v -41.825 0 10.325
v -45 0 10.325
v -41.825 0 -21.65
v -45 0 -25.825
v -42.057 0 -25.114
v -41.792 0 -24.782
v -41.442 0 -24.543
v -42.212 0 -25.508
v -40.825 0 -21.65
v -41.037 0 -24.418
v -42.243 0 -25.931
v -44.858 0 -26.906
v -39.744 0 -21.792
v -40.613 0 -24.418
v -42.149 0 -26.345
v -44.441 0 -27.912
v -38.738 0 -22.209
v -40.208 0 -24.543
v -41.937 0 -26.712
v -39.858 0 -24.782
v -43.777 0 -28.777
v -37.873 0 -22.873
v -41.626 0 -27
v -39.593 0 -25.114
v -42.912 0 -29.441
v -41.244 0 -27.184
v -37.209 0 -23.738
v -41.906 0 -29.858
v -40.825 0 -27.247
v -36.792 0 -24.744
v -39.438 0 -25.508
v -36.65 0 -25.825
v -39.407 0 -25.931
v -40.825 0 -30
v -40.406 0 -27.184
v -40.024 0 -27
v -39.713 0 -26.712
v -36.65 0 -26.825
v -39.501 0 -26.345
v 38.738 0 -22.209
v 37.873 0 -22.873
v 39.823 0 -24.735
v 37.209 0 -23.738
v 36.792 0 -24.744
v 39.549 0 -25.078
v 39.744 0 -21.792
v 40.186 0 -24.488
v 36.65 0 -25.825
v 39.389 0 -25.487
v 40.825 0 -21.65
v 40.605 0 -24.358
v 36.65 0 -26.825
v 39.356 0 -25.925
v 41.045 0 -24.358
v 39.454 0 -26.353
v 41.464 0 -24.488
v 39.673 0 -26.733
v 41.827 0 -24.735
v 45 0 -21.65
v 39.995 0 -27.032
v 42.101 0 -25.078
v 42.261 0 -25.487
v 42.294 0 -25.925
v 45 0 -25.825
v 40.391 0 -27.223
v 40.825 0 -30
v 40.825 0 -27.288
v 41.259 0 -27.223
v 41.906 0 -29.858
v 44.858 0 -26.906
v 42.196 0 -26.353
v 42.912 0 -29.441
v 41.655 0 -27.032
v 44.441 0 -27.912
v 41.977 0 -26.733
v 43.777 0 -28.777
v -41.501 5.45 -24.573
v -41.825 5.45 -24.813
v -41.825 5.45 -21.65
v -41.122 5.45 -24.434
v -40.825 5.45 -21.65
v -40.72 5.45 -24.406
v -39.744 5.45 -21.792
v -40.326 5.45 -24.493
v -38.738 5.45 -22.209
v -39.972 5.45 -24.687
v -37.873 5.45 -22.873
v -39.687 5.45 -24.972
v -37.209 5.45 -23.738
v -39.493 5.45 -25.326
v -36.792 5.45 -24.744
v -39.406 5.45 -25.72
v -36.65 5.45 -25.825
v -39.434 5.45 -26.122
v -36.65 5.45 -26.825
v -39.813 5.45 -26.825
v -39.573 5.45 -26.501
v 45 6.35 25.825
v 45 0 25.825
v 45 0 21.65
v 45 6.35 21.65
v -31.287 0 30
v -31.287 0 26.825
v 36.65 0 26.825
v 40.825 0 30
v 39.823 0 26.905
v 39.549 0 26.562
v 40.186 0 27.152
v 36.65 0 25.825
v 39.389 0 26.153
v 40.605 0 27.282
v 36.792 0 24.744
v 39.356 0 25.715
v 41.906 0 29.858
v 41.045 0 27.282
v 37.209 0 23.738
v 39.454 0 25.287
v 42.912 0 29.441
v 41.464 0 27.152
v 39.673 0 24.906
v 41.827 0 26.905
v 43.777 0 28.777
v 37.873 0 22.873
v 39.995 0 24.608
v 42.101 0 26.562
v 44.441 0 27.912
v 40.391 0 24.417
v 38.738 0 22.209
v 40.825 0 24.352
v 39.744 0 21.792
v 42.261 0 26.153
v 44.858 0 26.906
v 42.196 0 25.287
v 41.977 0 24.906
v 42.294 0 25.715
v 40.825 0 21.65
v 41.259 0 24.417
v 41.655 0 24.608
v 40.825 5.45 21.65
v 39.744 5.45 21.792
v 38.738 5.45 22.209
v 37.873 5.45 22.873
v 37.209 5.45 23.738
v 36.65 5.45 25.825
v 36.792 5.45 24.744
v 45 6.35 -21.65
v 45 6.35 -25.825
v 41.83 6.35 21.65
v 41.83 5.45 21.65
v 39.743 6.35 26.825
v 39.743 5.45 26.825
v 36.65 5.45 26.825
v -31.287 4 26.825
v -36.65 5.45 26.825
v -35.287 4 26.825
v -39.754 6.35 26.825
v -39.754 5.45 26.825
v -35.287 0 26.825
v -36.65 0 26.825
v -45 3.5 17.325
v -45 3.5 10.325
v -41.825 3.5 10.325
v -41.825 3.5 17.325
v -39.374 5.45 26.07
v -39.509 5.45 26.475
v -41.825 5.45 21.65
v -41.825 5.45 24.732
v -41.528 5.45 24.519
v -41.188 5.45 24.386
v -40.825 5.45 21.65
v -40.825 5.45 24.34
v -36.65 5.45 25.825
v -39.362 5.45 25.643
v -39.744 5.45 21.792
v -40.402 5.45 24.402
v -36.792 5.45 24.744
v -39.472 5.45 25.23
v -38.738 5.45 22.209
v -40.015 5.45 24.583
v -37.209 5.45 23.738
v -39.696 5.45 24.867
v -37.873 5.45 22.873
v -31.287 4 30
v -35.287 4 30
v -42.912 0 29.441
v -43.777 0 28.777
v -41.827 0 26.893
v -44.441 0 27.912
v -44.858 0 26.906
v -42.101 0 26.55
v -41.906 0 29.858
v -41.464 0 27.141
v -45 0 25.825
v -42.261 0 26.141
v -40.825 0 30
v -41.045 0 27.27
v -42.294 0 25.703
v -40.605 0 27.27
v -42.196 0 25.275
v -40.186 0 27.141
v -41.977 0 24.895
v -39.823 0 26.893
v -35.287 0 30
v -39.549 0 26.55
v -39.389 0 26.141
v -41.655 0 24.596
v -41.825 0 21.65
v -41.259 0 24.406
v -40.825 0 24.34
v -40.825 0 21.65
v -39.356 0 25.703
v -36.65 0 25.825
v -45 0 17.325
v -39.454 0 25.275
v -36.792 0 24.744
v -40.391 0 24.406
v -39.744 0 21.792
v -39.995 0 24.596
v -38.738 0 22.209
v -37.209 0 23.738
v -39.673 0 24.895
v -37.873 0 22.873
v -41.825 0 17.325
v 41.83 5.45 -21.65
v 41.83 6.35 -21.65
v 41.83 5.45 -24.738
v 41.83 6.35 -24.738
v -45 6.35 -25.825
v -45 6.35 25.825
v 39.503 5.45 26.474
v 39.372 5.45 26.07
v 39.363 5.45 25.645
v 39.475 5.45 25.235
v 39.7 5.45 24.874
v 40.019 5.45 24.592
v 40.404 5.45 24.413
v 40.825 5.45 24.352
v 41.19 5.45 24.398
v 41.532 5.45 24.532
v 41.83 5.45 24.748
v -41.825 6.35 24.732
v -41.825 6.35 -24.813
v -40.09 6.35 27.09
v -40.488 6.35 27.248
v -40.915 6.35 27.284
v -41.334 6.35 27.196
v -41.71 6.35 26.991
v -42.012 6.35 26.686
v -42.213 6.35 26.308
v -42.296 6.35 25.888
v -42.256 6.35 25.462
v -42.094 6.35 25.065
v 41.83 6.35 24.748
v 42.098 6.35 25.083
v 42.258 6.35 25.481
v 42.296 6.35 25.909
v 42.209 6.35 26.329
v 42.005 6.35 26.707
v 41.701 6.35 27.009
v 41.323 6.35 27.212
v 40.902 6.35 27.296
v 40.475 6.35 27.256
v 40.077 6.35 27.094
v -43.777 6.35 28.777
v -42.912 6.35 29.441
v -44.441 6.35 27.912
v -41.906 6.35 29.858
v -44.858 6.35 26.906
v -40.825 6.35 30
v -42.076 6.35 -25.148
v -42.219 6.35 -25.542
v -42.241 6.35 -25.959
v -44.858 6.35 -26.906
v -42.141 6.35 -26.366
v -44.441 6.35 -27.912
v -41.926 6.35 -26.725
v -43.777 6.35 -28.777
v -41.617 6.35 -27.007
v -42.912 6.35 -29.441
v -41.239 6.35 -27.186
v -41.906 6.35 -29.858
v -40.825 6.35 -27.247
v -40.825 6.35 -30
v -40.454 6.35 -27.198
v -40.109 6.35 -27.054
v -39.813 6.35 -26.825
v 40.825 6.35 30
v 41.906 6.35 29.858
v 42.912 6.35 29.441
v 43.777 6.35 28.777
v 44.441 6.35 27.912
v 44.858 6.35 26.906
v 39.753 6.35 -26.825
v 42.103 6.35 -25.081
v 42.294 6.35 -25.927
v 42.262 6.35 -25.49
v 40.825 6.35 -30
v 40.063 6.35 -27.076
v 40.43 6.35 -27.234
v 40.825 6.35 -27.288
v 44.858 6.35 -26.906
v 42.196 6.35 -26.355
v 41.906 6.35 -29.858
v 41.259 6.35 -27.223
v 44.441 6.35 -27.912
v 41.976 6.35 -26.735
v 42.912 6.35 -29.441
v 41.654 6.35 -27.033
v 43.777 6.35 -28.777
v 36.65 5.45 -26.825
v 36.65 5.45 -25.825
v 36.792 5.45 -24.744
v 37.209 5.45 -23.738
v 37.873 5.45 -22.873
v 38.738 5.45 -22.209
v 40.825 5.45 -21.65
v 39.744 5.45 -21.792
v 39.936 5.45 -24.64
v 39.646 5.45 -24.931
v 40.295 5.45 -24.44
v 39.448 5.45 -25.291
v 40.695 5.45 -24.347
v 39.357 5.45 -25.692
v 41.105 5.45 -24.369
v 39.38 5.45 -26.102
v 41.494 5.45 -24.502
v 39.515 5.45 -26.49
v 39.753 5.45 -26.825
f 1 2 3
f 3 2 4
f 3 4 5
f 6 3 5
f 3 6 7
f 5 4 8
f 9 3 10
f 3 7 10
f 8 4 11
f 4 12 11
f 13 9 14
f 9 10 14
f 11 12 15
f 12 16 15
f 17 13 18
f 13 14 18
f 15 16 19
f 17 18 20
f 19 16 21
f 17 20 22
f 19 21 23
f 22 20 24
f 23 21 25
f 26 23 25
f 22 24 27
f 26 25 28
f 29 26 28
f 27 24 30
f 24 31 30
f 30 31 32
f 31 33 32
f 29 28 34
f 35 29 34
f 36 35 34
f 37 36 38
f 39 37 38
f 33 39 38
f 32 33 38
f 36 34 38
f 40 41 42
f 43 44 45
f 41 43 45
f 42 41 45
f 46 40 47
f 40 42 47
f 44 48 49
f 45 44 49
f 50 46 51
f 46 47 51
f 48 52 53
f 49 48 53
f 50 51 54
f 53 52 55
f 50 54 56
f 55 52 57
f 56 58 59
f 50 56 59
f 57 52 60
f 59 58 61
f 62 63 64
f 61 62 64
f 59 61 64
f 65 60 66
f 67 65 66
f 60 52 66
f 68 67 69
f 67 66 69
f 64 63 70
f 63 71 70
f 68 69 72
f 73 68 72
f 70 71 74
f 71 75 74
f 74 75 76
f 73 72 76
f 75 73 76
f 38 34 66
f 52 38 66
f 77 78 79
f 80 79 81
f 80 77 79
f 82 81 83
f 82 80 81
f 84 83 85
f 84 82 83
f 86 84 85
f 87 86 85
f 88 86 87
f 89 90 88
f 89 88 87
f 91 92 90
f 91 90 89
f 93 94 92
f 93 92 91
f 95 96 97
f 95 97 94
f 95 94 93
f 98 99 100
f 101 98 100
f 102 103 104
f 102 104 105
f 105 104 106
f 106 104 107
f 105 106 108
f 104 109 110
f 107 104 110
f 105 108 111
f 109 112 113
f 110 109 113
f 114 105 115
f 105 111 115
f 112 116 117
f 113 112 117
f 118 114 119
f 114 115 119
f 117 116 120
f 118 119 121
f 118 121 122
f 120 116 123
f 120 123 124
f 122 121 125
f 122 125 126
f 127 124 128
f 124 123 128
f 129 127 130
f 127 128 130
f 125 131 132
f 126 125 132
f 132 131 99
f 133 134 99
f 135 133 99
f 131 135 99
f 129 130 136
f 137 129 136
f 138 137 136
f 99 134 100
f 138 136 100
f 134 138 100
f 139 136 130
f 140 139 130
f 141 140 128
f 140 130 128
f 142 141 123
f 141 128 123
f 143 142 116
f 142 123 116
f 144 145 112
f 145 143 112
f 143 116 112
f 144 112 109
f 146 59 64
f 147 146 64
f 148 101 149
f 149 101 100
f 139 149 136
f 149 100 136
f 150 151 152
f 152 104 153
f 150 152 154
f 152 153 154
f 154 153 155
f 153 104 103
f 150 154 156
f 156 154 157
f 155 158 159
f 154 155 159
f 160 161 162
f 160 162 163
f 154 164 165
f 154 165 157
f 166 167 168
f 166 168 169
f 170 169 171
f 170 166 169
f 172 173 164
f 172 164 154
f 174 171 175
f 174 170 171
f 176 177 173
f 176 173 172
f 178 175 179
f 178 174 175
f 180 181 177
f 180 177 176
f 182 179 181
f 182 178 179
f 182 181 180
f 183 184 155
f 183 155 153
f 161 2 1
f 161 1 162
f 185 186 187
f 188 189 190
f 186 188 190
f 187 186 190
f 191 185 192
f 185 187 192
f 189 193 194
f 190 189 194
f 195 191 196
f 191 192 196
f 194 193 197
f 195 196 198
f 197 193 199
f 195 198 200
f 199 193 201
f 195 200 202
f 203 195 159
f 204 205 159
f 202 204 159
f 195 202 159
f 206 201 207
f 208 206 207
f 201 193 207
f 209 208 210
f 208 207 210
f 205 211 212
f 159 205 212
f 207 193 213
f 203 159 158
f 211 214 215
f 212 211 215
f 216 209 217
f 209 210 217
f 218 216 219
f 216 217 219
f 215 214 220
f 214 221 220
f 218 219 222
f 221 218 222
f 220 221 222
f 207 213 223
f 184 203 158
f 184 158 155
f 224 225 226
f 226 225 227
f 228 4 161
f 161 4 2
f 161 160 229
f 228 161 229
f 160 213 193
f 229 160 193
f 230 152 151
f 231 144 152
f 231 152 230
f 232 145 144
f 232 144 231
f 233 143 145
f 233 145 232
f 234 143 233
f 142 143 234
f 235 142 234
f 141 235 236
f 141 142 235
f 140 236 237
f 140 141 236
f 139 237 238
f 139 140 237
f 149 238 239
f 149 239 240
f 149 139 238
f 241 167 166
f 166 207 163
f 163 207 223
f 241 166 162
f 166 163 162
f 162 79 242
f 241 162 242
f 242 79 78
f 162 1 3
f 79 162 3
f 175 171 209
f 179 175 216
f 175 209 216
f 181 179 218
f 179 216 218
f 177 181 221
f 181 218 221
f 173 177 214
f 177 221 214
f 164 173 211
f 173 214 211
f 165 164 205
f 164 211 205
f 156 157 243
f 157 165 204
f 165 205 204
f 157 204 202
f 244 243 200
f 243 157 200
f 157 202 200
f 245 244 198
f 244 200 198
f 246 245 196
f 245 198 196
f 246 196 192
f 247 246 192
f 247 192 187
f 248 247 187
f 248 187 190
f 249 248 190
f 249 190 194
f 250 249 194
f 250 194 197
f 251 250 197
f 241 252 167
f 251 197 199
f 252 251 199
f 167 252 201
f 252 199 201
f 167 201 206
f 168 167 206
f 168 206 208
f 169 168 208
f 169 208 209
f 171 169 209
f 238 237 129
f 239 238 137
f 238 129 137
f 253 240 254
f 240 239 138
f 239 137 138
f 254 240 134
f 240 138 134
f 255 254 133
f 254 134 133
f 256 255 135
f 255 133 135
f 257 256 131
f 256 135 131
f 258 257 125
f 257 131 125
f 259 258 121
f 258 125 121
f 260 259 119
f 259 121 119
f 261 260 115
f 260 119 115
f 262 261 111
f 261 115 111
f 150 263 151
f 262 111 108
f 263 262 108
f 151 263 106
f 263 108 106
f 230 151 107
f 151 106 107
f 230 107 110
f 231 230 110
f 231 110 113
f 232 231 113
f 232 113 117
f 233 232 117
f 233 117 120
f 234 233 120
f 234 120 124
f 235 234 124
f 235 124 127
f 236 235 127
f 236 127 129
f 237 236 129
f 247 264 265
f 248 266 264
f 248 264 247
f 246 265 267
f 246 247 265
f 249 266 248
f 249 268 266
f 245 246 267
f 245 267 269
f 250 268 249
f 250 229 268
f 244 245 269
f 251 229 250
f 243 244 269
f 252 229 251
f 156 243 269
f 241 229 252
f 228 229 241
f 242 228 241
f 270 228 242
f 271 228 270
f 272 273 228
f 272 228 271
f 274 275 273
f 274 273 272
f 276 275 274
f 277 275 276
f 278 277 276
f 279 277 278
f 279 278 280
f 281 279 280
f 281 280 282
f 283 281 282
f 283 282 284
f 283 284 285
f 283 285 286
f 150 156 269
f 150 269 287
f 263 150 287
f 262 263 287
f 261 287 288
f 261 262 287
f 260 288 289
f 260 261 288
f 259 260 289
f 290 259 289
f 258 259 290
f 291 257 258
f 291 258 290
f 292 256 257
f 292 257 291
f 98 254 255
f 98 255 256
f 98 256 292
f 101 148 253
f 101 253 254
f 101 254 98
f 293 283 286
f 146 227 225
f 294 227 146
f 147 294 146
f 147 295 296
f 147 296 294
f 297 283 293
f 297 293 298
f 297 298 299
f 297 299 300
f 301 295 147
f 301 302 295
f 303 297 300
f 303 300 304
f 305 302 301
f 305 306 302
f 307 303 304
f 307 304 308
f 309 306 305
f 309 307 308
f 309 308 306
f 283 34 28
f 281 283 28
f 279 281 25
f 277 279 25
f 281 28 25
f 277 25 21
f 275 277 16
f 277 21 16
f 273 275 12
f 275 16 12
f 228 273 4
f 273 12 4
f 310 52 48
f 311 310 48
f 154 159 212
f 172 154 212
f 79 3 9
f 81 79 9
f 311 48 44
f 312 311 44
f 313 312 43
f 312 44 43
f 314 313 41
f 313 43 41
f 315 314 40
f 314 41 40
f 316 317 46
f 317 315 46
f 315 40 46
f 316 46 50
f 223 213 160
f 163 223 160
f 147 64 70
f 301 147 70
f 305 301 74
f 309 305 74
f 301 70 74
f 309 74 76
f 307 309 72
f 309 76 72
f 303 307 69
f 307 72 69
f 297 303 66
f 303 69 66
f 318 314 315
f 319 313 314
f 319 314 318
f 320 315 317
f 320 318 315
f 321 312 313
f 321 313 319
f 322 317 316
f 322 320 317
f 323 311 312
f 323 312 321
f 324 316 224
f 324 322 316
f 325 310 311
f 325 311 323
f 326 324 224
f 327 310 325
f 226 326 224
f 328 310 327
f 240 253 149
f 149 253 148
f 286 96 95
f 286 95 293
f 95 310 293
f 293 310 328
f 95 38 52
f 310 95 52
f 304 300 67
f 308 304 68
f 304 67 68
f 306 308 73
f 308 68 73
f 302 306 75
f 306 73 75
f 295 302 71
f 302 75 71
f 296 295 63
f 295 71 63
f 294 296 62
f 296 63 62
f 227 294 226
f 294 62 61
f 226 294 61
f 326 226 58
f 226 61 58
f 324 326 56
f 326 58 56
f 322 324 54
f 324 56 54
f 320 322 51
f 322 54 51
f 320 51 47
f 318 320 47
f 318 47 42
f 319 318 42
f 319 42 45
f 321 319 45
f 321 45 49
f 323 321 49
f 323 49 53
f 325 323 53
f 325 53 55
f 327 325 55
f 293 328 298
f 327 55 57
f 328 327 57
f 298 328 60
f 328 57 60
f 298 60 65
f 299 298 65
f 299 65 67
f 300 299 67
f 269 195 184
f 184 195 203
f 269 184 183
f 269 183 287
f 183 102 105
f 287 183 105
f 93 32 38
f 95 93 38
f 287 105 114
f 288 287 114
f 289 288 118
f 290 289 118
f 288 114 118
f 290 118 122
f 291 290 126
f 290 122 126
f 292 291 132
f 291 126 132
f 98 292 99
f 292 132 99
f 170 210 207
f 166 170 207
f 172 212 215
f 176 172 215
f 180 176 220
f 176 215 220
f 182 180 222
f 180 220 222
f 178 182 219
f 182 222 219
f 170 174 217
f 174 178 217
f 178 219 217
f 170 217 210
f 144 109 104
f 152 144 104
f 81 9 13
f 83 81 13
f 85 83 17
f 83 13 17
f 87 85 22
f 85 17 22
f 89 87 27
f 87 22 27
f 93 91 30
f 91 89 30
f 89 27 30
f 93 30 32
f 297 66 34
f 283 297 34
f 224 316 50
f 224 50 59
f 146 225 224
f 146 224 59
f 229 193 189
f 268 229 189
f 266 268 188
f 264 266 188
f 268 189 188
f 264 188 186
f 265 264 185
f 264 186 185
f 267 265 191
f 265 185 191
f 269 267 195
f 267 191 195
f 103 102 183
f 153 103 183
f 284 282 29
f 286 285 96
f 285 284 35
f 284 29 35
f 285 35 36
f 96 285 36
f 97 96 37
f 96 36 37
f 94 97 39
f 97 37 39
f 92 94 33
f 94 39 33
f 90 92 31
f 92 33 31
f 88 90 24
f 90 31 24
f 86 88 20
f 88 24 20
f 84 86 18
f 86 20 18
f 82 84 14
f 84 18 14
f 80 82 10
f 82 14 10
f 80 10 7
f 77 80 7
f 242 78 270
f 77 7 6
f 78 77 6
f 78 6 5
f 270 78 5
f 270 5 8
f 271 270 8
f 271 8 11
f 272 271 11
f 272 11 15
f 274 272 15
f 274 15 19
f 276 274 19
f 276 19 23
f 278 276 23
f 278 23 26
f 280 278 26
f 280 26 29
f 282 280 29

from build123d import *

# Parameters (mm, degrees)
BOSS_EXTRUDE3_DEPTH = 6.35
SKETCH5_W           = 7
SKETCH5_H           = 7
CUT_EXTRUDE3_DEPTH  = 3.175
SKETCH7_R           = 1.4224
SKETCH7_R_2         = 1.4732
CUT_EXTRUDE5_DEPTH  = 6.35
SKETCH8_W           = 3.175
SKETCH8_H           = 43.3
CUT_EXTRUDE6_DEPTH  = 10
SKETCH9_W           = 4
SKETCH9_H           = 4
CUT_EXTRUDE8_DEPTH  = 4
SKETCH10_W          = 5.175
SKETCH10_H          = 5.175
SKETCH10_W_2        = 5.18
CUT_EXTRUDE9_DEPTH  = 0.9


with BuildPart() as part:
    # Sketch2 → Boss-Extrude3 (new body)
    with BuildSketch(Plane(origin=(0, 0, 0), x_dir=(1, 0, 0), z_dir=(0, 1, 0))):
        with BuildLine():
            Line((-45, 25.825), (-45, -25.825))
            ThreePointArc((-45, -25.825), (-43.777170811, -28.777170811), (-40.825, -30))
            Line((-40.825, -30), (40.825, -30))
            ThreePointArc((40.825, -30), (43.777170811, -28.777170811), (45, -25.825))
            Line((45, -25.825), (45, 25.825))
            ThreePointArc((45, 25.825), (43.777170811, 28.777170811), (40.825, 30))
            Line((40.825, 30), (-40.825, 30))
            ThreePointArc((-40.825, 30), (-43.777170811, 28.777170811), (-45, 25.825))
        make_face()
        with BuildLine():
            Line((40.825, 21.65), (41.825, 21.65))
            Line((41.825, 21.65), (41.825, -21.65))
            Line((41.825, -21.65), (40.825, -21.65))
            ThreePointArc((40.825, -21.65), (37.872829189, -22.872829189), (36.65, -25.825))
            Line((36.65, -25.825), (36.65, -26.825))
            Line((36.65, -26.825), (-36.65, -26.825))
            Line((-36.65, -26.825), (-36.65, -25.825))
            ThreePointArc((-36.65, -25.825), (-37.872829189, -22.872829189), (-40.825, -21.65))
            Line((-40.825, -21.65), (-41.825, -21.65))
            Line((-41.825, -21.65), (-41.825, 21.65))
            Line((-41.825, 21.65), (-40.825, 21.65))
            ThreePointArc((-40.825, 21.65), (-37.872829189, 22.872829189), (-36.65, 25.825))
            Line((-36.65, 25.825), (-36.65, 26.825))
            Line((-36.65, 26.825), (36.65, 26.825))
            Line((36.65, 26.825), (36.65, 25.825))
            ThreePointArc((36.65, 25.825), (37.872829189, 22.872829189), (40.825, 21.65))
        make_face(mode=Mode.SUBTRACT)
    extrude(amount=BOSS_EXTRUDE3_DEPTH)

    # Sketch5 → Cut-Extrude3 (cut)
    with BuildSketch(Plane.ZY.offset(45)):
        with Locations((13.825, 0)):
            Rectangle(SKETCH5_W, SKETCH5_H)
    extrude(amount=-CUT_EXTRUDE3_DEPTH, mode=Mode.SUBTRACT)

    # Sketch7 → Cut-Extrude5 (cut)
    with BuildSketch(Plane.XZ):
        with Locations(Location((-40.825, -25.825, 0), (0, 0, 270))):
            Circle(SKETCH7_R)
        with Locations(Location((-40.825, 25.81356336, 0), (0, 0, 270))):
            Circle(SKETCH7_R_2)
        with Locations(Location((40.825, 25.825, 0), (0, 0, 270))):
            Circle(SKETCH7_R_2)
        with Locations(Location((40.825, -25.81487963, 0), (0, 0, 270))):
            Circle(SKETCH7_R_2)
    extrude(amount=-CUT_EXTRUDE5_DEPTH, mode=Mode.SUBTRACT)

    # Sketch8 → Cut-Extrude6 (cut)
    with BuildSketch(Plane(origin=(0, 6.35, 0), x_dir=(1, 0, 0), z_dir=(0, 1, 0))):
        with Locations((43.4125, 0)):
            Rectangle(SKETCH8_W, SKETCH8_H)
    extrude(amount=-CUT_EXTRUDE6_DEPTH, mode=Mode.SUBTRACT)

    # Sketch9 → Cut-Extrude8 (cut)
    with BuildSketch(Plane.XY.offset(30)):
        with Locations((-33.2866, 2)):
            Rectangle(SKETCH9_W, SKETCH9_H)
    extrude(amount=-CUT_EXTRUDE8_DEPTH, mode=Mode.SUBTRACT)

    # Sketch10 → Cut-Extrude9 (cut)
    with BuildSketch(Plane(origin=(0, 6.35, 0), x_dir=(1, 0, 0), z_dir=(0, 1, 0))):
        with Locations((-39.2375, 24.2375)):
            Rectangle(SKETCH10_W, SKETCH10_H)
        with Locations((-39.2375, -24.2375)):
            Rectangle(SKETCH10_W, SKETCH10_H)
        with Locations((39.24, -24.2375)):
            Rectangle(SKETCH10_W_2, SKETCH10_H)
        with Locations((39.24, 24.2375)):
            Rectangle(SKETCH10_W_2, SKETCH10_H)
    extrude(amount=-CUT_EXTRUDE9_DEPTH, mode=Mode.SUBTRACT)


solid = part.part
